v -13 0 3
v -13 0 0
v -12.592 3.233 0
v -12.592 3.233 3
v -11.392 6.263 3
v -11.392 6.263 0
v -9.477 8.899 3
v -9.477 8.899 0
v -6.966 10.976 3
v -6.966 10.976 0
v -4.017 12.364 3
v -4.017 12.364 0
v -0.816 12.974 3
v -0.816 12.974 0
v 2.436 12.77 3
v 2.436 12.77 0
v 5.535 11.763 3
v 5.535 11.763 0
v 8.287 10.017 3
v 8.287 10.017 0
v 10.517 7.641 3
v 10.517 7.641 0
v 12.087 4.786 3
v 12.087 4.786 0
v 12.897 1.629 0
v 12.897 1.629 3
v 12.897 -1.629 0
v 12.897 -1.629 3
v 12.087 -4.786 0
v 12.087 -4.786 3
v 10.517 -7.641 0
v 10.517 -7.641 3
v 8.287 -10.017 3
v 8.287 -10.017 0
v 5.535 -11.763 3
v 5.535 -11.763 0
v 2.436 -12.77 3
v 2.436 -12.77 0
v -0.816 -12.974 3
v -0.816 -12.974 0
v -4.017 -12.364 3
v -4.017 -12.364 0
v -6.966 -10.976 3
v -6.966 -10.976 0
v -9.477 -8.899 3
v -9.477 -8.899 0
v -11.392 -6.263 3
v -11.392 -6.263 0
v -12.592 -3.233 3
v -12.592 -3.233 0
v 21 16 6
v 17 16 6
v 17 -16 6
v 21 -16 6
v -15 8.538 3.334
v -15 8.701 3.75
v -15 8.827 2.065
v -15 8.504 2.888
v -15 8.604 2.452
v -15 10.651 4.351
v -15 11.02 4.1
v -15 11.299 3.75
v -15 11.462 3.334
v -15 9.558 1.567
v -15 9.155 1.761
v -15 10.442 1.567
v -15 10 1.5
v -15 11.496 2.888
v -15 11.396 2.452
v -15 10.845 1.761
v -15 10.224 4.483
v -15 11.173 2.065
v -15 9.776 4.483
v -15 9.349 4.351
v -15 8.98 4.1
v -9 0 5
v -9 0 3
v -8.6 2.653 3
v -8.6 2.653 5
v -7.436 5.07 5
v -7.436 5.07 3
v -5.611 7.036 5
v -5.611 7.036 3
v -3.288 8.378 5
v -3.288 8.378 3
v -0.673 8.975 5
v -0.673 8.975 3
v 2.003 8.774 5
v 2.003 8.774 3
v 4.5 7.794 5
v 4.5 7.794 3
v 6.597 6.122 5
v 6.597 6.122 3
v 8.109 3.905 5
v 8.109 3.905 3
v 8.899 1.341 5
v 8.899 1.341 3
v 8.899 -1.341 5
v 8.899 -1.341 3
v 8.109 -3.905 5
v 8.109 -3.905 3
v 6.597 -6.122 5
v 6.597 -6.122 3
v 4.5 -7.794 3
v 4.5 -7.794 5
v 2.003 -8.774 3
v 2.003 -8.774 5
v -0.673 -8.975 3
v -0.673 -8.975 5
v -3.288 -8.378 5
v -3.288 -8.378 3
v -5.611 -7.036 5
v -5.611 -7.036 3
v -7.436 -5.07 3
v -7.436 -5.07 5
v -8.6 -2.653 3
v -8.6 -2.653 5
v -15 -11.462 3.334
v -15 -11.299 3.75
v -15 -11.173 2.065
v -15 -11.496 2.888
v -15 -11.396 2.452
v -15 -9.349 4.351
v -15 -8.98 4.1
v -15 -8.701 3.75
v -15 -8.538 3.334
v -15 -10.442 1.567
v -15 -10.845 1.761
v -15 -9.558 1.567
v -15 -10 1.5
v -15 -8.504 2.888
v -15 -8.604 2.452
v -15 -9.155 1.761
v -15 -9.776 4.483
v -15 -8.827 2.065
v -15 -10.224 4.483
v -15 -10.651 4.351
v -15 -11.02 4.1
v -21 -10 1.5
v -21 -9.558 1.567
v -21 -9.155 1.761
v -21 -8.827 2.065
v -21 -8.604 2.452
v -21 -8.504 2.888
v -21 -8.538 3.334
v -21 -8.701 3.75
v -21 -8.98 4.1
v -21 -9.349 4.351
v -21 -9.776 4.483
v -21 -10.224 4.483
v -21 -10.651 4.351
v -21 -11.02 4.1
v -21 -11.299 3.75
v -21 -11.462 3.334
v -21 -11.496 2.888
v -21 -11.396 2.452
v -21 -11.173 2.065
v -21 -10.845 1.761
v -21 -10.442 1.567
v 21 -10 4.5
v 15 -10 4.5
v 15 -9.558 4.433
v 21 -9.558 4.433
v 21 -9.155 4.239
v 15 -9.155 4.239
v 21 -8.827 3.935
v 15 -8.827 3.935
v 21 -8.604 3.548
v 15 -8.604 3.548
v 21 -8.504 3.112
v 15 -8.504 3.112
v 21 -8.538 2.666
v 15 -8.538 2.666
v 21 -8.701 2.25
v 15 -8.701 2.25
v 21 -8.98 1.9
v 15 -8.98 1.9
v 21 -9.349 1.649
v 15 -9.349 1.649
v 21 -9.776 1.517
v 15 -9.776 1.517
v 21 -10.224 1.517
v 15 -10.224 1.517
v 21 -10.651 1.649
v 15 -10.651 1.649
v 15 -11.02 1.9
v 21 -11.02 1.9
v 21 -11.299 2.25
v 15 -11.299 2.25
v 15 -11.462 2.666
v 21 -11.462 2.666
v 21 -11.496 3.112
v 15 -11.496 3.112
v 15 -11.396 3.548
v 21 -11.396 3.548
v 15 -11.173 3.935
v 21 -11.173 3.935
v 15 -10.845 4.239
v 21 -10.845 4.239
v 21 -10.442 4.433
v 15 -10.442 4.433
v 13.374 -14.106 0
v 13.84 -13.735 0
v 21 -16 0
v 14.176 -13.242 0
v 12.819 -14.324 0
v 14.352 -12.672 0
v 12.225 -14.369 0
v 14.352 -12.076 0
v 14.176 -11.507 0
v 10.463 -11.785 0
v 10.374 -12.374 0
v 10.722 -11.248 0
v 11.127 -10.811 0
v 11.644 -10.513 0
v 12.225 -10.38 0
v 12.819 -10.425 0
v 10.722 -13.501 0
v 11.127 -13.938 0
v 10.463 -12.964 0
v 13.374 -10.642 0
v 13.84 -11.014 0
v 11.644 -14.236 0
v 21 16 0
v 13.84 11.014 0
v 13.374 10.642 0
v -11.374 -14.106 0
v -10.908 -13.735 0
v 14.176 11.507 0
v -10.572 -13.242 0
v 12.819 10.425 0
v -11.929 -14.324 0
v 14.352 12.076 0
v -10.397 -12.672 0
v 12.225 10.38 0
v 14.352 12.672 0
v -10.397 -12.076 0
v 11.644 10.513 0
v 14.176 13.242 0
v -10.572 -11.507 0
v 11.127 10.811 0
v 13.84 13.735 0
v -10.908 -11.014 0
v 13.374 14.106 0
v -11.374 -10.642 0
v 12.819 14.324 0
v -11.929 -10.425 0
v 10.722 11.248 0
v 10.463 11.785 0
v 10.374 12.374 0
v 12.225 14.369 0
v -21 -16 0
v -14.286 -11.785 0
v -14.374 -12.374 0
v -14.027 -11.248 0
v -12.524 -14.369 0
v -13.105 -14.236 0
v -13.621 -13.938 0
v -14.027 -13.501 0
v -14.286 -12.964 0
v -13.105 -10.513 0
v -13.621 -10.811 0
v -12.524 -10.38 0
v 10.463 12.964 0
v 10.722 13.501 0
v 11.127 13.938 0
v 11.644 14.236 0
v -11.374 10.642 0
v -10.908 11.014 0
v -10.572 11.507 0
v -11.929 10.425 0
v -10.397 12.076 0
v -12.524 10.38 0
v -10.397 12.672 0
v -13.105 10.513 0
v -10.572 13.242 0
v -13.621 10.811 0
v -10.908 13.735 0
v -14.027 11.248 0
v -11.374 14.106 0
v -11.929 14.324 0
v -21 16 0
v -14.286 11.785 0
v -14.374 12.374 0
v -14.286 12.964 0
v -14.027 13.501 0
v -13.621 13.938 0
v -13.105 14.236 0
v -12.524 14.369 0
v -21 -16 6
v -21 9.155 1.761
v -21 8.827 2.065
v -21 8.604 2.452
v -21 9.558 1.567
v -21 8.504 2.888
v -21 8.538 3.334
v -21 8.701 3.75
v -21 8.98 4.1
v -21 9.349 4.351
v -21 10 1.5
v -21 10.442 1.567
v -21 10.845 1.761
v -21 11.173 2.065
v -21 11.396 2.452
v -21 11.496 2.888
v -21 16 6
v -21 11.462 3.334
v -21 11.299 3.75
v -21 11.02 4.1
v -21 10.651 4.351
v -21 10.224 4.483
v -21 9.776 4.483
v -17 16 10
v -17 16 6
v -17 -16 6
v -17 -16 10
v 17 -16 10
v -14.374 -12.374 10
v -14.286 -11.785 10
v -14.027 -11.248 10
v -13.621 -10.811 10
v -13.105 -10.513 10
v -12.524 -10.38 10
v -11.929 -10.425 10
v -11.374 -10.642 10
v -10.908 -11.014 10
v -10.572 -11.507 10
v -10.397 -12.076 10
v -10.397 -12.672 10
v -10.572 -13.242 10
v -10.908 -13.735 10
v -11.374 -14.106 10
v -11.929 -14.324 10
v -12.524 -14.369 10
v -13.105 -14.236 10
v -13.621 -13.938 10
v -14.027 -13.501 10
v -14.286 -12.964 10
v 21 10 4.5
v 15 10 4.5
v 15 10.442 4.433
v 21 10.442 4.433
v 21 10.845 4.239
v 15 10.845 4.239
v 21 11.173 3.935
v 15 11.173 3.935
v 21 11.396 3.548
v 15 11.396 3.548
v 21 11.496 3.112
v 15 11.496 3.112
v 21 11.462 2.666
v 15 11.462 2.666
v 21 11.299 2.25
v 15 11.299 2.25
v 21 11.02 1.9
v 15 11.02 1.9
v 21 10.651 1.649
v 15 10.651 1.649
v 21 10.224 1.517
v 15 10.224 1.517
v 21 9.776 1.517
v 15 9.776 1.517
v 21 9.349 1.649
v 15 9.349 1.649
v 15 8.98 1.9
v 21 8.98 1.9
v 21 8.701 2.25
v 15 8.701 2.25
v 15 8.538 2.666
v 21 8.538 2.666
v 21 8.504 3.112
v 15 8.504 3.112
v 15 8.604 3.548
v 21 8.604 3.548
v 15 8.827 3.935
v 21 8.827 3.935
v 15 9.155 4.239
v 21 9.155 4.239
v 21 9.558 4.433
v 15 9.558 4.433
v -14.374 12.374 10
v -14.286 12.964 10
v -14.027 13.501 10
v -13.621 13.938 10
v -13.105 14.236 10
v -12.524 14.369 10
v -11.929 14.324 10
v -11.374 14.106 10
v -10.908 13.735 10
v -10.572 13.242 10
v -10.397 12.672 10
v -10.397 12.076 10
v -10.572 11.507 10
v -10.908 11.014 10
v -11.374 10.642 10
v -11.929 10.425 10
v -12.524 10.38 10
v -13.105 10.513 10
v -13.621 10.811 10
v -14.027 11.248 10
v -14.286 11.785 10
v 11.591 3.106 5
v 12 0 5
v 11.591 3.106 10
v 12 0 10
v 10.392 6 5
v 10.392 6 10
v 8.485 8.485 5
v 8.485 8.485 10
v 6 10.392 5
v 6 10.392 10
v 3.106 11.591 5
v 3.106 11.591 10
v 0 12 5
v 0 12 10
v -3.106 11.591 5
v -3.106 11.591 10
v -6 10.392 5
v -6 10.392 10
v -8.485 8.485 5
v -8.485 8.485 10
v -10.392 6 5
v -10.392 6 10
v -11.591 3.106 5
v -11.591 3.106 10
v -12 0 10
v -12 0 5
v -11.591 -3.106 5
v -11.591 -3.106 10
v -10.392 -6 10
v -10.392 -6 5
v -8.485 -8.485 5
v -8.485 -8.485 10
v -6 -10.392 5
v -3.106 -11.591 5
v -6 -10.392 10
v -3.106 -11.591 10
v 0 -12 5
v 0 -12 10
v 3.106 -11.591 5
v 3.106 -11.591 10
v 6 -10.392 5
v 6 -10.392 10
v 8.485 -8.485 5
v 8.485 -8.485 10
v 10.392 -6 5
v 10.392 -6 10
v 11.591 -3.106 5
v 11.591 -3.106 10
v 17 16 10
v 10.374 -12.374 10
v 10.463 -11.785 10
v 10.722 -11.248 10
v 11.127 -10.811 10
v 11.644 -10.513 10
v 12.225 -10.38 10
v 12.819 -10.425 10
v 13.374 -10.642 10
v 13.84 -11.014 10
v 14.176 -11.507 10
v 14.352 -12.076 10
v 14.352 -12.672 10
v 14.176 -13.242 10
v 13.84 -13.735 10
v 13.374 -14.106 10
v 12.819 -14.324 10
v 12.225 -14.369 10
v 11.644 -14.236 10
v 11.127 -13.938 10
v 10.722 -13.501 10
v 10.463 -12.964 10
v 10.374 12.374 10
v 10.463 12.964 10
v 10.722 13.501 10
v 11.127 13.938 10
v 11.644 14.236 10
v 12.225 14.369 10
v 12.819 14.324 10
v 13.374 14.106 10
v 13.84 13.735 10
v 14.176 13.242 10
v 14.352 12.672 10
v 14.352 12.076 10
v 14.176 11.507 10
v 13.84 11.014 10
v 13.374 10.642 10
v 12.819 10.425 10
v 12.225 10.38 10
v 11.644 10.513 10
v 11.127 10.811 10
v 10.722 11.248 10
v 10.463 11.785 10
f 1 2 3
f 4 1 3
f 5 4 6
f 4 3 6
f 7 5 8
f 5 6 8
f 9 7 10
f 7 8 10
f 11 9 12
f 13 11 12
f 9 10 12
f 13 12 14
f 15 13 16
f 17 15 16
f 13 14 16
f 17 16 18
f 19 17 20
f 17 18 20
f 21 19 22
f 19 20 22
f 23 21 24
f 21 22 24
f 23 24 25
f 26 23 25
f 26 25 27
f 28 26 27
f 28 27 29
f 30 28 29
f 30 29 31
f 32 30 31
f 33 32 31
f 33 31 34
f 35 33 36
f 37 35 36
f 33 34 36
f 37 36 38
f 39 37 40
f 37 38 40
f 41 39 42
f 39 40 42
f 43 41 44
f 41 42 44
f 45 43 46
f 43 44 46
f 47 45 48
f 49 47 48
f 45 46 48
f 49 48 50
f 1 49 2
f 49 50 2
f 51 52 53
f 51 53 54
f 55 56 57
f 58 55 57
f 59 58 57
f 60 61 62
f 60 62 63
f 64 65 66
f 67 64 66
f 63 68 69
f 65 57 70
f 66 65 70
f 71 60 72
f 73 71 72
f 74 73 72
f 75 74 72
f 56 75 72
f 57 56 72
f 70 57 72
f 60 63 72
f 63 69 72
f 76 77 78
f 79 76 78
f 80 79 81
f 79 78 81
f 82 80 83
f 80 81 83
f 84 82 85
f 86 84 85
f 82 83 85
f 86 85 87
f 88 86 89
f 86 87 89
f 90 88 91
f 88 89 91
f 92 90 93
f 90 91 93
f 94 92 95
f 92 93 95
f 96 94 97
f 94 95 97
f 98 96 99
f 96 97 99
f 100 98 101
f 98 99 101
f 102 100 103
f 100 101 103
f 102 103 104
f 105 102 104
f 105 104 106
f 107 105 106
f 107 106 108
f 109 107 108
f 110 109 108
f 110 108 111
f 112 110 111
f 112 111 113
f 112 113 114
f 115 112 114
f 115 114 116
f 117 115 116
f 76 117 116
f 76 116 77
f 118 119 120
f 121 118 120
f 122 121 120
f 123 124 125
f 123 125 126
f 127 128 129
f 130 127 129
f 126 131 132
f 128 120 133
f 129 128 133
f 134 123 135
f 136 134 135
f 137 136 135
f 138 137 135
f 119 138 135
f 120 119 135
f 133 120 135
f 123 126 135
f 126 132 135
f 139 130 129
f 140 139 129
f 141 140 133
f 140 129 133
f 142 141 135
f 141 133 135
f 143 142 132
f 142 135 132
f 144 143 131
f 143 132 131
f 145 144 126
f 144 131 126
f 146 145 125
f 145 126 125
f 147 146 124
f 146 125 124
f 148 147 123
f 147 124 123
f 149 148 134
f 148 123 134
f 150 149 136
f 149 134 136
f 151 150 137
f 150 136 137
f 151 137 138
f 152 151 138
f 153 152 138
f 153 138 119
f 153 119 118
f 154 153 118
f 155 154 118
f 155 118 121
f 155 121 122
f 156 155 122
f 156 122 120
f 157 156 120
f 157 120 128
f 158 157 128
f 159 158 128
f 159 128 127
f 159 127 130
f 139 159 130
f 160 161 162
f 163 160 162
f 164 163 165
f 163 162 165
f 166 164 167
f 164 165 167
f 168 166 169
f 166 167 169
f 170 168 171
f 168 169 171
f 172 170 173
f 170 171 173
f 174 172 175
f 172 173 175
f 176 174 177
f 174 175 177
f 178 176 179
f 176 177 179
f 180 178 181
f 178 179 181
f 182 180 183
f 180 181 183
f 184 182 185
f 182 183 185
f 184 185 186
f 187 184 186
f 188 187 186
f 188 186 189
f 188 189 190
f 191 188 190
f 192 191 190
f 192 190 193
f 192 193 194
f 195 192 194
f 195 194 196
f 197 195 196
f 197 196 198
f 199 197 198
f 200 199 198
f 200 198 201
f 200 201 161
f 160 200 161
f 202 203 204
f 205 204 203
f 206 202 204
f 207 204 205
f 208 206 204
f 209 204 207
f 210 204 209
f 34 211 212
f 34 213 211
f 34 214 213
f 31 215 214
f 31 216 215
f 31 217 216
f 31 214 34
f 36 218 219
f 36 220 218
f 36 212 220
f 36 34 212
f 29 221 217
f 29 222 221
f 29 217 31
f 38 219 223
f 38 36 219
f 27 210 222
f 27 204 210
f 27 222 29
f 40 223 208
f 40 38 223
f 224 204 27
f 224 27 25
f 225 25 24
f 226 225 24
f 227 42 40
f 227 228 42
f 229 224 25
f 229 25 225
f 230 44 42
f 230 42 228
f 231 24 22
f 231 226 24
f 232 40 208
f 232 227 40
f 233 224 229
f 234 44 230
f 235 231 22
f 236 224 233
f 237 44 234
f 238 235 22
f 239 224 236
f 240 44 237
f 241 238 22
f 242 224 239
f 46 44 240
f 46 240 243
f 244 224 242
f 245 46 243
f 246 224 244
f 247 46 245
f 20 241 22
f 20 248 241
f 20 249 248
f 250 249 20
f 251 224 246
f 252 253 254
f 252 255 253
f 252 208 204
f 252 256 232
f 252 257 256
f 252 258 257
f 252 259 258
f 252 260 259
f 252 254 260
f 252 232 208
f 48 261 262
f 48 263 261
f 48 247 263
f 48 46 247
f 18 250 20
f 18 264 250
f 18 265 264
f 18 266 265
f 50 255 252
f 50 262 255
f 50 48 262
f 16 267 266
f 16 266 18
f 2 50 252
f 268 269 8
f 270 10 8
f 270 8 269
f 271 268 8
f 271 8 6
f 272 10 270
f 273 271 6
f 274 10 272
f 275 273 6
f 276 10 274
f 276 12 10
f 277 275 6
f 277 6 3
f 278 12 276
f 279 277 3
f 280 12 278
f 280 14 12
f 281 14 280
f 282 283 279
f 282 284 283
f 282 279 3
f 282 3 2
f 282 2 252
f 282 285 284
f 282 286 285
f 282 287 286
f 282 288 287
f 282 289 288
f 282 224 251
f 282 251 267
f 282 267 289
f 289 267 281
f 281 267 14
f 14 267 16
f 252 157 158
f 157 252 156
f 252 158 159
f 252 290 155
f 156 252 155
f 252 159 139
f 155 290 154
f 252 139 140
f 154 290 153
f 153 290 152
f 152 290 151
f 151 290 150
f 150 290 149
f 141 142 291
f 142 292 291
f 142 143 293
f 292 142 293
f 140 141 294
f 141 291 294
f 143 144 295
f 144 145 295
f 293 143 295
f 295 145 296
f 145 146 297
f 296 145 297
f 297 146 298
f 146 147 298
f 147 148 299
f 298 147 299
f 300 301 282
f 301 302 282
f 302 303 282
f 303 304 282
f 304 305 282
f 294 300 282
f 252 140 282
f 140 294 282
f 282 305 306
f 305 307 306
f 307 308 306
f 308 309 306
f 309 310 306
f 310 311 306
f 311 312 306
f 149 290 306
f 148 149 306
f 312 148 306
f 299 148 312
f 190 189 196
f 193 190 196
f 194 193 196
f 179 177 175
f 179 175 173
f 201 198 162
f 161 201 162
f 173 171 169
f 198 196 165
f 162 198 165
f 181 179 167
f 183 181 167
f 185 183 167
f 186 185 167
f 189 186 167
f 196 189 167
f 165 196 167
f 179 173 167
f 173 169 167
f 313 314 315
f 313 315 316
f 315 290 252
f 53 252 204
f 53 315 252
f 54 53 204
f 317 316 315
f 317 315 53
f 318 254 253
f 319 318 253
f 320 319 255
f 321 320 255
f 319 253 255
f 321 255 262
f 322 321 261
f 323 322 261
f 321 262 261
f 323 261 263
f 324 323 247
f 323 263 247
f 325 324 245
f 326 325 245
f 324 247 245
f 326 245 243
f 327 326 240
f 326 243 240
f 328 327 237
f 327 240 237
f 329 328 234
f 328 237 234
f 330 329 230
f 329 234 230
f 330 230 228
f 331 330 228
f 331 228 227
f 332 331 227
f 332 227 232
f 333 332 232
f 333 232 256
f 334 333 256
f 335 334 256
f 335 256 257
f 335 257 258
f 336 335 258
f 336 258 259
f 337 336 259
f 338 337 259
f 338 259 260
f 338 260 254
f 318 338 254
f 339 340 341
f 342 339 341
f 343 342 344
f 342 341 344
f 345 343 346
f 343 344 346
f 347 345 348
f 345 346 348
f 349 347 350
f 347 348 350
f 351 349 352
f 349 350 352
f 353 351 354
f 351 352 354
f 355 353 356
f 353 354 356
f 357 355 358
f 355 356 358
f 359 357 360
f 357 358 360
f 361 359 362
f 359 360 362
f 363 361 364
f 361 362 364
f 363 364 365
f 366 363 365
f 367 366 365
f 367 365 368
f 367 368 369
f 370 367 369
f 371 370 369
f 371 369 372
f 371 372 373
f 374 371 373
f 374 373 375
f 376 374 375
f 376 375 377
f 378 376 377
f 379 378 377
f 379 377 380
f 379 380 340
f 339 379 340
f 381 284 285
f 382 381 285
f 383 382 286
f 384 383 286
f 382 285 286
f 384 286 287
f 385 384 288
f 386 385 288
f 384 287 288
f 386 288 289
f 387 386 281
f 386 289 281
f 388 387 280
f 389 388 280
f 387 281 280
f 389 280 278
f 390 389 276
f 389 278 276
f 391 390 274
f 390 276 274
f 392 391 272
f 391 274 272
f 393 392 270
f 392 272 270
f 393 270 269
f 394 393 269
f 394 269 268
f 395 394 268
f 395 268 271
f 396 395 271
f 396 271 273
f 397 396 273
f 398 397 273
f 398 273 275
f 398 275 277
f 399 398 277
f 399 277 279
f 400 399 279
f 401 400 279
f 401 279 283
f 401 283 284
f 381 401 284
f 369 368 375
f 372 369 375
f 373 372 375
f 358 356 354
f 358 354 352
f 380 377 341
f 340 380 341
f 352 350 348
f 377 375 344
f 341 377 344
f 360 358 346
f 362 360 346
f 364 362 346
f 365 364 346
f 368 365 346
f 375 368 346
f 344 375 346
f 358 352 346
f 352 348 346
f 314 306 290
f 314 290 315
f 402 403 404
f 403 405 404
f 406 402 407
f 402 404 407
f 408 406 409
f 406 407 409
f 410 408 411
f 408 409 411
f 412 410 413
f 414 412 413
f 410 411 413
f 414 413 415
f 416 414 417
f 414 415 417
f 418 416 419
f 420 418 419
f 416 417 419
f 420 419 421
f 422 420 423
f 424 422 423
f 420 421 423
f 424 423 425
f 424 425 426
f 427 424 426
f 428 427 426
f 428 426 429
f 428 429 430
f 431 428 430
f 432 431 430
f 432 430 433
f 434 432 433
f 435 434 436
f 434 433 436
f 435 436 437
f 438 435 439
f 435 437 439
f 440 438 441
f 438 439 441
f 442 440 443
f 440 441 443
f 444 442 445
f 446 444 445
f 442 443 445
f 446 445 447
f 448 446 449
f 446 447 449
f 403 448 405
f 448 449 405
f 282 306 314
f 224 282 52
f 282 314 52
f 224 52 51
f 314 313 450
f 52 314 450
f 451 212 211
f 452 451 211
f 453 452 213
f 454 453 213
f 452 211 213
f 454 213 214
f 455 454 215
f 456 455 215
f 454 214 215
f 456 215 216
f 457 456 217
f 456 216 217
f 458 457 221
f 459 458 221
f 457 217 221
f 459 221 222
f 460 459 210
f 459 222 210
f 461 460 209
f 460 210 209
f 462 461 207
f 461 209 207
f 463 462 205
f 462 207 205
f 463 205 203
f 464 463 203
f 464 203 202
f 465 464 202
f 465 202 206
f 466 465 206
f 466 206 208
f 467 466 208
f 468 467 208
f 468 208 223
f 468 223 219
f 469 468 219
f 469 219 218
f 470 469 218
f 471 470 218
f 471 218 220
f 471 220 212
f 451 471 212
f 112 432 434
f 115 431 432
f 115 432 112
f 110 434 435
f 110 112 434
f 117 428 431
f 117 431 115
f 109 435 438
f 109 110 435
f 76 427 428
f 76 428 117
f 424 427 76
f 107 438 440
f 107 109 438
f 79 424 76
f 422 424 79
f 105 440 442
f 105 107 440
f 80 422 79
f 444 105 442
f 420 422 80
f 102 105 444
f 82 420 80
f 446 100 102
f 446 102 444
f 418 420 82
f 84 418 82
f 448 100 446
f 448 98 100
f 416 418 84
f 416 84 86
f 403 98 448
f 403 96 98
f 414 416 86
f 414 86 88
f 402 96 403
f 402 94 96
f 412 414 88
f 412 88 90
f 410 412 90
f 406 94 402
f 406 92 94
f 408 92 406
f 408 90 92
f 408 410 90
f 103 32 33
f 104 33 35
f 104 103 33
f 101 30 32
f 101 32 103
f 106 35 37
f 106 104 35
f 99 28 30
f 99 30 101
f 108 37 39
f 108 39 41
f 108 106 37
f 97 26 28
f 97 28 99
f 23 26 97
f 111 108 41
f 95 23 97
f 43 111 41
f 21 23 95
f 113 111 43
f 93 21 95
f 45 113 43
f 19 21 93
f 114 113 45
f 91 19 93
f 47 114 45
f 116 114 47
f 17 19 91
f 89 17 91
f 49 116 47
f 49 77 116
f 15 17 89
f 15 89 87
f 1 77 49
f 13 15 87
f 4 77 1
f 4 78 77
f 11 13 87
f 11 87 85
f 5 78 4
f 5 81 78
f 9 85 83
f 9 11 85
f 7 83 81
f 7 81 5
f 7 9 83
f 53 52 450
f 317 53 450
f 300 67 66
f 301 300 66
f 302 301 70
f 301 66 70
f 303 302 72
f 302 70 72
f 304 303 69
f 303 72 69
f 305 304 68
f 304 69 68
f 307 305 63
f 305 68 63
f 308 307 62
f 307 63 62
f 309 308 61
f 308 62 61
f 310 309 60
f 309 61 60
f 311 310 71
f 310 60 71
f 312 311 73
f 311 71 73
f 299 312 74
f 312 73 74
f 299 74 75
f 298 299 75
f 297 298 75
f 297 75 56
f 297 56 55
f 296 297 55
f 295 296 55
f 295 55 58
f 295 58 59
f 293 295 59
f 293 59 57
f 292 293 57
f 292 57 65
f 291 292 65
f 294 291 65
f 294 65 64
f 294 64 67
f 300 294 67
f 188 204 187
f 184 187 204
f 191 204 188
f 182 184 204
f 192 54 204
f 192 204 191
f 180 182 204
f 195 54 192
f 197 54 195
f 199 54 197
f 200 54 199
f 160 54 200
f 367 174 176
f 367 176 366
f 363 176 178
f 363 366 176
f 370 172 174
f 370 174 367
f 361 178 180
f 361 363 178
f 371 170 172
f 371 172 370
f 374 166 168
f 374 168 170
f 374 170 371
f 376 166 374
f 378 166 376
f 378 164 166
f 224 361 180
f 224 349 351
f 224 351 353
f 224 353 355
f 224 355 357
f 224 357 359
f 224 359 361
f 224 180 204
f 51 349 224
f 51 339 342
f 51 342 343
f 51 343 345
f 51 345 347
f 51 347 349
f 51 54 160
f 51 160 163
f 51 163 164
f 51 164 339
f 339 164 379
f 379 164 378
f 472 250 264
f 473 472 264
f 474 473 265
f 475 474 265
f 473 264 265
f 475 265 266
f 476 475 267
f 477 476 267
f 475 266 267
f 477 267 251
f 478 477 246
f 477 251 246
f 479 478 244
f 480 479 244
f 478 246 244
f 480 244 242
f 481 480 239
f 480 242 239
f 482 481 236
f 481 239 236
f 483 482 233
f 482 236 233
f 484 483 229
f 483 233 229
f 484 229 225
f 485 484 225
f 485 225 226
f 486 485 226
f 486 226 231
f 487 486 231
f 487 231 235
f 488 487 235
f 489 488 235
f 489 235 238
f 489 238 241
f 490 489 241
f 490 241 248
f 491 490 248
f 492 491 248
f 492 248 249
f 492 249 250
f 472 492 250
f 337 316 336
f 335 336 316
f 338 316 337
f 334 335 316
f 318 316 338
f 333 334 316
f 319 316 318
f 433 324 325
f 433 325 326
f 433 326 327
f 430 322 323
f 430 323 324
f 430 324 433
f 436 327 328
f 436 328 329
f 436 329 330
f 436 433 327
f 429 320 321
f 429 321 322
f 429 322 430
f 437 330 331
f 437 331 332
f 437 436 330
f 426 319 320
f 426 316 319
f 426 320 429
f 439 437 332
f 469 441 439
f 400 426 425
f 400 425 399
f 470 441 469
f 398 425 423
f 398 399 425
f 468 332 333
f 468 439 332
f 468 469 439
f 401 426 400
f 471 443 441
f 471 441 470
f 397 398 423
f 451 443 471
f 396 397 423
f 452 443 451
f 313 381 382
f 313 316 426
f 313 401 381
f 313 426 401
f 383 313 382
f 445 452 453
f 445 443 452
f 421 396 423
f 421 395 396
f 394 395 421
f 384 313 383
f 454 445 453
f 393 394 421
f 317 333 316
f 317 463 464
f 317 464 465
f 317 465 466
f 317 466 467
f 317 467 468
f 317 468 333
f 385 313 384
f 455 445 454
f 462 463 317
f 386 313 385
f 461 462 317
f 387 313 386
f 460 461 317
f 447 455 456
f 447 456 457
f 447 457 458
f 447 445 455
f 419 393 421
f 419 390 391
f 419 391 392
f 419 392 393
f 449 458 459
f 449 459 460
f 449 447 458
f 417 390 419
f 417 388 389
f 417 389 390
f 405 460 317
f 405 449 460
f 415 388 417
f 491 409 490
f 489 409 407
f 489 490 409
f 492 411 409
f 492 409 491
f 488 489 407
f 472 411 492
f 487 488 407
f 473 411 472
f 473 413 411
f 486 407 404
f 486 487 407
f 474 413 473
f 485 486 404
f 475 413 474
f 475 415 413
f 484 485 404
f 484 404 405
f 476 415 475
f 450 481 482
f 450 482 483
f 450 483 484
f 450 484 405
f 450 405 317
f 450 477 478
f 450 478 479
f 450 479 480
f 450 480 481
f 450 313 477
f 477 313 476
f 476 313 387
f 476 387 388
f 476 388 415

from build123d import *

# Parameters (mm, degrees)
SKETCH_1_W                    = 42
SKETCH_1_H                    = 32
EXTRUDE_1_DEPTH               = 10
SKETCH_2_W                    = 4
SKETCH_2_H                    = 4
CUT_EXTRUDE_1_DEPTH           = 40.56008089
SKETCH_3_W                    = 4
SKETCH_3_H                    = 4
CUT_EXTRUDE_2_DEPTH           = 40.56008089
HOLE_WIZARD_4_0_4_1_D         = 4
HOLE_WIZARD_3_0_3_1_D         = 3
HOLE_WIZARD_3_0_3_1_DEPTH     = 6
HOLE_WIZARD_3_0_3_2_D         = 3
HOLE_WIZARD_3_0_3_2_DEPTH     = 6
HOLE_WIZARD_M20_1_D           = 23
HOLE_WIZARD_M20_1_CBORE_D     = 24
HOLE_WIZARD_M20_1_CBORE_DEPTH = 4
SKETCH_12_R                   = 11.5
SKETCH_12_R_2                 = 9
EXTRUDE_2_DEPTH               = 6
SKETCH_13_R                   = 12
CUT_EXTRUDE_3_DEPTH           = 5
SKETCH_14_R                   = 13
CUT_EXTRUDE_4_DEPTH           = 3


with BuildPart() as part:
    # 草图1 → 凸台-拉伸1 (new body)
    with BuildSketch(Plane.XY.offset(10)):
        Rectangle(SKETCH_1_W, SKETCH_1_H)
    extrude(amount=-EXTRUDE_1_DEPTH)

    # 草图2 → 切除-拉伸1 (cut, through all)
    with BuildSketch(Plane.XZ.offset(16)):
        with Locations((-19, 8)):
            Rectangle(SKETCH_2_W, SKETCH_2_H)
    extrude(amount=-CUT_EXTRUDE_1_DEPTH, mode=Mode.SUBTRACT)

    # 草图3 → 切除-拉伸2 (cut, through all)
    with BuildSketch(Plane.XZ.offset(16)):
        with Locations((19, 8)):
            Rectangle(SKETCH_3_W, SKETCH_3_H)
    extrude(amount=-CUT_EXTRUDE_2_DEPTH, mode=Mode.SUBTRACT)

    # Ø4.0 (4) 直径孔1 (through all)
    with Locations(Plane.XY.offset(10)):
        with Locations((12.374368671, 12.374368671), (12.374368671, -12.374368671), (-12.374368671, -12.374368671), (-12.374368671, 12.374368671)):
            Hole(HOLE_WIZARD_4_0_4_1_D / 2)

    # Ø3.0 (3) 直径孔1
    with Locations(Plane(origin=(21, 0, 0), x_dir=(0, 0, -1), z_dir=(1, 0, 0))):
        with Locations((-3, -10), (-3, 10)):
            Hole(HOLE_WIZARD_3_0_3_1_D / 2, depth=HOLE_WIZARD_3_0_3_1_DEPTH)

    # Ø3.0 (3) 直径孔2
    with Locations(Plane.ZY.offset(21)):
        with Locations((3, -10), (3, 10)):
            Hole(HOLE_WIZARD_3_0_3_2_D / 2, depth=HOLE_WIZARD_3_0_3_2_DEPTH)

    # M20 六角头螺栓的柱形沉头孔1 (through all)
    with Locations(Plane.XY.offset(10)):
        with Locations((0, 0)):
            CounterBoreHole(HOLE_WIZARD_M20_1_D / 2, HOLE_WIZARD_M20_1_CBORE_D / 2, HOLE_WIZARD_M20_1_CBORE_DEPTH)

    # 草图12 → 凸台-拉伸2 (add)
    with BuildSketch(Plane(origin=(0, 0, 0), x_dir=(-1, 0, 0), z_dir=(0, 0, -1))):
        Circle(SKETCH_12_R)
        Circle(SKETCH_12_R_2, mode=Mode.SUBTRACT)
    extrude(amount=-EXTRUDE_2_DEPTH)

    # 草图13 → 切除-拉伸3 (cut)
    with BuildSketch(Plane.XY.offset(10)):
        Circle(SKETCH_13_R)
    extrude(amount=-CUT_EXTRUDE_3_DEPTH, mode=Mode.SUBTRACT)

    # 草图14 → 切除-拉伸4 (cut)
    with BuildSketch(Plane(origin=(0, 0, 0), x_dir=(-1, 0, 0), z_dir=(0, 0, -1))):
        Circle(SKETCH_14_R)
    extrude(amount=-CUT_EXTRUDE_4_DEPTH, mode=Mode.SUBTRACT)


solid = part.part
